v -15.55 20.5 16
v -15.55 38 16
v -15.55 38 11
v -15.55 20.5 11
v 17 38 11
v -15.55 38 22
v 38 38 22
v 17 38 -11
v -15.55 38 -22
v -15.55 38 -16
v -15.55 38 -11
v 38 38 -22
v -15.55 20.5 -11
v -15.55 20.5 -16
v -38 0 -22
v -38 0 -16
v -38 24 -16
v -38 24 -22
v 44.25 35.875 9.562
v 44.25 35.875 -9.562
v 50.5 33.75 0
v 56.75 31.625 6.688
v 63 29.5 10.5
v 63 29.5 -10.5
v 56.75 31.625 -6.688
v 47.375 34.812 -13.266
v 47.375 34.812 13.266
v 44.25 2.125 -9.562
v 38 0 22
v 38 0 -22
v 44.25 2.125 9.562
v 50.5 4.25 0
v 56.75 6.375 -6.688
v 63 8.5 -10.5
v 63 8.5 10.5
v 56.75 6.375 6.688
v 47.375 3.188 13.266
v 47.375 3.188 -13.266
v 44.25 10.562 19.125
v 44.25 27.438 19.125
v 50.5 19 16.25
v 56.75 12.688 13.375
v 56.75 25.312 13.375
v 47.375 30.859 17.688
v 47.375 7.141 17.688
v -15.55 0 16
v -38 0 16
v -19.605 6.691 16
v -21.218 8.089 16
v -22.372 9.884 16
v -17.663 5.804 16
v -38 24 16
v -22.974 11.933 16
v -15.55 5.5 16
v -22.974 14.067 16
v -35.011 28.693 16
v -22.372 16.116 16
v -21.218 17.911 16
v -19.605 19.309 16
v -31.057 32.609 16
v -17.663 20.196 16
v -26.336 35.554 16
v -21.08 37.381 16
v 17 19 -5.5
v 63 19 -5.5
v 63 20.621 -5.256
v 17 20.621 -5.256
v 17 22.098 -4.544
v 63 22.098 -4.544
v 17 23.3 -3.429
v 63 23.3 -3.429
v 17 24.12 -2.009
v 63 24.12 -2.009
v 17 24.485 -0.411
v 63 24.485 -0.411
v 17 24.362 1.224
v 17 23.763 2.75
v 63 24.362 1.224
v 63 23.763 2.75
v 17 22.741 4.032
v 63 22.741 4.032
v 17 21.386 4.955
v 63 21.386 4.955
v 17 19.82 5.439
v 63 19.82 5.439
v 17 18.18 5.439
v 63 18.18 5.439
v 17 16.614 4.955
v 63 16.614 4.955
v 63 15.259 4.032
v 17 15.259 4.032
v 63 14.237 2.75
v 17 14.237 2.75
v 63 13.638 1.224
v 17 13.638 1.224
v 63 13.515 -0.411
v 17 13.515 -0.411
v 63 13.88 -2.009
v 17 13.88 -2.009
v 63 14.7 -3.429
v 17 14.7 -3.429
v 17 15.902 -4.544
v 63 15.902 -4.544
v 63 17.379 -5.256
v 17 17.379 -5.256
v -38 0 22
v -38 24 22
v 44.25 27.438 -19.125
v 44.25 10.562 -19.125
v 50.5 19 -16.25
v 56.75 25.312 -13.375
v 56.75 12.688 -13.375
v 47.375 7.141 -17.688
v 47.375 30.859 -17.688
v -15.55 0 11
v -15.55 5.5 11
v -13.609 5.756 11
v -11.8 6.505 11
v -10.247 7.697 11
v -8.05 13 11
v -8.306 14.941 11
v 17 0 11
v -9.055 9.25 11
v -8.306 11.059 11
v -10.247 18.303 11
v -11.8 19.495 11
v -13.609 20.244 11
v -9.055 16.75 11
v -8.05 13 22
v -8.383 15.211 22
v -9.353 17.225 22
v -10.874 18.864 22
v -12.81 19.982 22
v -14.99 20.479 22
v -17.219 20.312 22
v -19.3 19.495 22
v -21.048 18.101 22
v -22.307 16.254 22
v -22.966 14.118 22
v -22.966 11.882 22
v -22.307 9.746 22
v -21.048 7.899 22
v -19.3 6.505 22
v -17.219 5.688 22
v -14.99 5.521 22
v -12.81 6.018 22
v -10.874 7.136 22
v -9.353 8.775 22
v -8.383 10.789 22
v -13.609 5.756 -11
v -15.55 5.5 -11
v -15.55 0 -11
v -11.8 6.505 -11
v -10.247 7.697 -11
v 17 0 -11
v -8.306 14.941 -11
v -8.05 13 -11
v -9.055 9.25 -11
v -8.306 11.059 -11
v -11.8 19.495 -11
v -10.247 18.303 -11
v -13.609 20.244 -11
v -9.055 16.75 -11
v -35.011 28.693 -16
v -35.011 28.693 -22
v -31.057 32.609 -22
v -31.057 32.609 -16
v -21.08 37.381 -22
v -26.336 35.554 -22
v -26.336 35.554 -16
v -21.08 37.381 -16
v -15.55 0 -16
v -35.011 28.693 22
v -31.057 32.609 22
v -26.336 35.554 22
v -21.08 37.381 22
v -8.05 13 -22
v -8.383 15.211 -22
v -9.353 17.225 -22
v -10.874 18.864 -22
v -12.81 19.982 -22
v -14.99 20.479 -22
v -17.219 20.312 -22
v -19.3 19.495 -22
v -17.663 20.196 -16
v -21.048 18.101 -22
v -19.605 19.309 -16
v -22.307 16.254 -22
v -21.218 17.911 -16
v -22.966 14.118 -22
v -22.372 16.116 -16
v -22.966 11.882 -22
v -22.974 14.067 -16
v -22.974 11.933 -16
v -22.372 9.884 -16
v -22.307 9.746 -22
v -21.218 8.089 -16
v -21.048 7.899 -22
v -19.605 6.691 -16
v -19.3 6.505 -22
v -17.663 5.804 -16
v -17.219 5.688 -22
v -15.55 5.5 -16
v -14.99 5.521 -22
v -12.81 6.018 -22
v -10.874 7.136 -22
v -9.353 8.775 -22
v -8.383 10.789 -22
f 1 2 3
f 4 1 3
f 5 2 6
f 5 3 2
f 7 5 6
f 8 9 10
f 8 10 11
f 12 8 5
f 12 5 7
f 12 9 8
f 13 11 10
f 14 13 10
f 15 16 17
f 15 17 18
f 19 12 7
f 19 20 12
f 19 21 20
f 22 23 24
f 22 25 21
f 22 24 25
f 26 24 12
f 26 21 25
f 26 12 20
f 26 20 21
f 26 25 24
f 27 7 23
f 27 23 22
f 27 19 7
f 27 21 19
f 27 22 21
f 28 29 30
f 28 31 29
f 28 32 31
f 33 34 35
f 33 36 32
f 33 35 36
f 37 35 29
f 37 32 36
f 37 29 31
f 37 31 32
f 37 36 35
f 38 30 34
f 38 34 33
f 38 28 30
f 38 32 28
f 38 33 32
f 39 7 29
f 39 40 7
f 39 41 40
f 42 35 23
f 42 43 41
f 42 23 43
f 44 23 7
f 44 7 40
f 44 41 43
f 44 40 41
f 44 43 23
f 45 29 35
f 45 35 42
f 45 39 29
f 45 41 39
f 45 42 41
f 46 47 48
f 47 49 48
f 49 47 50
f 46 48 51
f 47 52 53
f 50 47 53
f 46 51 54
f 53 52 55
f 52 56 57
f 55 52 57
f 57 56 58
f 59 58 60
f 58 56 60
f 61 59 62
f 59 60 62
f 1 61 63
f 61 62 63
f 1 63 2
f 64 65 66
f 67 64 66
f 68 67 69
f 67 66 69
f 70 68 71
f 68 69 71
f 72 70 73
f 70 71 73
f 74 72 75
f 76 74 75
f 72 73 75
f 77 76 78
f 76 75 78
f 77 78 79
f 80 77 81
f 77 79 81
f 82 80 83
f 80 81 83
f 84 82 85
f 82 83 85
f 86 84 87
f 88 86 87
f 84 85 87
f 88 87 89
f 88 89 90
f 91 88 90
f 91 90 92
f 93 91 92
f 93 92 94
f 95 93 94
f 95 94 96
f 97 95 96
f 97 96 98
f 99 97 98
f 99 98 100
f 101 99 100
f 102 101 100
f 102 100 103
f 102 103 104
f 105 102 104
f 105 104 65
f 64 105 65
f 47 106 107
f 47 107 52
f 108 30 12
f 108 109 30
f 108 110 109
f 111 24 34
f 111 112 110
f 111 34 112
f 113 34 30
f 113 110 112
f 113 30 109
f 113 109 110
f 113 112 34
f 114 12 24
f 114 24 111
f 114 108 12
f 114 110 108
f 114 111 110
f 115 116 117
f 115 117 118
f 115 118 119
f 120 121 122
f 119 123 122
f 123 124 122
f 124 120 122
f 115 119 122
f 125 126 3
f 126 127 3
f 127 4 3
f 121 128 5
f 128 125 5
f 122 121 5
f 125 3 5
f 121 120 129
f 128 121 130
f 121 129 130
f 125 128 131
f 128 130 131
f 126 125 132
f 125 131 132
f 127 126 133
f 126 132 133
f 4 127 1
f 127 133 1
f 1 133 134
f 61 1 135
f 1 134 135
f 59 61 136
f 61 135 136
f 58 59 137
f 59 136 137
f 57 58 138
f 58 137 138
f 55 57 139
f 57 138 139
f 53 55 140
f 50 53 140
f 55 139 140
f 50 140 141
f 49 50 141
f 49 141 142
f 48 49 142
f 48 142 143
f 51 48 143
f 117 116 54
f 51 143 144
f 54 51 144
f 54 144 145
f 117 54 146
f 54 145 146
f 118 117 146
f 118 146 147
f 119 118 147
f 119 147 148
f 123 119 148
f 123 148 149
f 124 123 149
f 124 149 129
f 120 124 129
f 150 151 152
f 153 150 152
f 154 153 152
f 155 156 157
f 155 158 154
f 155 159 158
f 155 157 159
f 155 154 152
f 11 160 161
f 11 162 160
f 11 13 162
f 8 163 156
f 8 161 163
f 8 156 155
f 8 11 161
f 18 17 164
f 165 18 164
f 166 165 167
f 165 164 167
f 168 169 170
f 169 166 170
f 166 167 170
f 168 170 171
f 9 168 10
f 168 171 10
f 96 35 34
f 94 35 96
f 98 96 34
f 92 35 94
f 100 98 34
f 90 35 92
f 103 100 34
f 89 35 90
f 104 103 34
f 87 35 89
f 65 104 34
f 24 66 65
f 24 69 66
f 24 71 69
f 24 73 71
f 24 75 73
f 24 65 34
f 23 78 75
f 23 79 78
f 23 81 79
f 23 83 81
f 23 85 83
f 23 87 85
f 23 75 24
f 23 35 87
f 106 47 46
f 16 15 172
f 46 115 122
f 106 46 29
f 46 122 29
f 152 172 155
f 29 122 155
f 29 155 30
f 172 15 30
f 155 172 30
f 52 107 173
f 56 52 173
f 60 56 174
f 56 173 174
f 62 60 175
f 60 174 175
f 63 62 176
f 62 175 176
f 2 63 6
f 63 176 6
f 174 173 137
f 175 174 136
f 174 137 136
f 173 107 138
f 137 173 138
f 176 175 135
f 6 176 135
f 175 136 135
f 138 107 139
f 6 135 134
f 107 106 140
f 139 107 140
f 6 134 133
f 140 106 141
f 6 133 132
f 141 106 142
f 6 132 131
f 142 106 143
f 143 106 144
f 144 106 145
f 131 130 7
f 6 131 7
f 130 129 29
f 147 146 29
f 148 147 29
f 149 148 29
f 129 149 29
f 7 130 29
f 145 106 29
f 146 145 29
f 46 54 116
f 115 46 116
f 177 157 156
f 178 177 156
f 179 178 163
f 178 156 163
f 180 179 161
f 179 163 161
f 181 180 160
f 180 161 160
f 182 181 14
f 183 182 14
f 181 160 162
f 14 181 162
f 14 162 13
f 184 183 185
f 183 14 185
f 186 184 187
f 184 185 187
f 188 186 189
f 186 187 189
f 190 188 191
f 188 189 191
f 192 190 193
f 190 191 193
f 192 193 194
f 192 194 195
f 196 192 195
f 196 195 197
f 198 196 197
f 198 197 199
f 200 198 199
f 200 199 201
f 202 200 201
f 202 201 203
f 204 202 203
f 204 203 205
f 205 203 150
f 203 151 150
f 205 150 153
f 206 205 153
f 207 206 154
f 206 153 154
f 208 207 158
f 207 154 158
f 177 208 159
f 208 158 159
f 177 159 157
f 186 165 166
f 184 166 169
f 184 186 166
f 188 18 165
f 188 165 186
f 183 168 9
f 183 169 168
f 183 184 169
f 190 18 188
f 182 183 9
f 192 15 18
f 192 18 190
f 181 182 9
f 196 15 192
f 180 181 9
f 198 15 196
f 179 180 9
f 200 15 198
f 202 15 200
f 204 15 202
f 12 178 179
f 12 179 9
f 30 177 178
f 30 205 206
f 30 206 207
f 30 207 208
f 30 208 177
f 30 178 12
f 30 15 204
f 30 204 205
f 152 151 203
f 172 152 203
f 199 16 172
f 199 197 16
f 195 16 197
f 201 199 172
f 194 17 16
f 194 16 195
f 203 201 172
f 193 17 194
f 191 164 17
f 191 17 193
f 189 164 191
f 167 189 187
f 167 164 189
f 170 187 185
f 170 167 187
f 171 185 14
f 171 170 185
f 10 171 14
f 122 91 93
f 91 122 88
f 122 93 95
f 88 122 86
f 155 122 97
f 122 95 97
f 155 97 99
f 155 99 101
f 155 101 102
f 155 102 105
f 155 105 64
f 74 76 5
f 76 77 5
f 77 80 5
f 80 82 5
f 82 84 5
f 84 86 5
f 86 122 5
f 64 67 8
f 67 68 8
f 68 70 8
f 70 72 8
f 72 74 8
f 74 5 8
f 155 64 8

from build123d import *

# Parameters (mm, degrees)
SKETCH1_W               = 76
SKETCH1_H               = 44
BOSS_EXTRUDE1_DEPTH     = 38
SKETCH2_R               = 7.5
CUT_EXTRUDE1_DEPTH      = 1
CUT_EXTRUDE1_DEPTH_BACK = 45
SKETCH3_W               = 22.449944321
SKETCH3_H               = 32
SKETCH3_W_2             = 32.550055679
SKETCH3_H_2             = 22
CUT_EXTRUDE2_DEPTH      = 1
CUT_EXTRUDE2_DEPTH_BACK = 39
SKETCH5_W               = 44
SKETCH5_H               = 38
SKETCH4_W               = 21
SKETCH4_H               = 21
SKETCH6_R               = 5.5
CUT_EXTRUDE3_DEPTH      = 1.0000001
CUT_EXTRUDE3_DEPTH_BACK = 102


with BuildPart() as part:
    # Sketch1 → Boss-Extrude1 (new body)
    with BuildSketch(Plane(origin=(0, 0, 0), x_dir=(1, 0, 0), z_dir=(0, 1, 0))):
        Rectangle(SKETCH1_W, SKETCH1_H)
    extrude(amount=BOSS_EXTRUDE1_DEPTH)

    # Sketch2 → Cut-Extrude1 (cut, two sides)
    with BuildSketch(Plane.XY.offset(22)) as cut_extrude1_sk:
        with Locations((-15.550055679, 13)):
            Circle(SKETCH2_R)
        with BuildLine():
            Line((-15.550055679, 38), (-38, 38))
            Line((-38, 38), (-38, 24))
            ThreePointArc((-38, 24), (-28.778812235, 34.213203436), (-15.550055679, 38))
        make_face()
    extrude(amount=CUT_EXTRUDE1_DEPTH, mode=Mode.SUBTRACT)
    extrude(cut_extrude1_sk.sketch, amount=-CUT_EXTRUDE1_DEPTH_BACK, mode=Mode.SUBTRACT)

    # Sketch3 → Cut-Extrude2 (cut, two sides)
    with BuildSketch(Plane(origin=(0, 38, 0), x_dir=(1, 0, 0), z_dir=(0, 1, 0))) as cut_extrude2_sk:
        with Locations((-26.77502784, 0)):
            Rectangle(SKETCH3_W, SKETCH3_H)
        with Locations((0.72497216, 0)):
            Rectangle(SKETCH3_W_2, SKETCH3_H_2)
    extrude(amount=CUT_EXTRUDE2_DEPTH, mode=Mode.SUBTRACT)
    extrude(cut_extrude2_sk.sketch, amount=-CUT_EXTRUDE2_DEPTH_BACK, mode=Mode.SUBTRACT)

    # Sketch5 → Loft1 section 0
    with BuildSketch(Plane(origin=(38, 0, 0), x_dir=(0, 0, -1), z_dir=(1, 0, 0))):
        with Locations((0, 19)):
            Rectangle(SKETCH5_W, SKETCH5_H)
    # Sketch4 → Loft1 section 1
    with BuildSketch(Plane(origin=(63, 0, 0), x_dir=(0, 0, -1), z_dir=(1, 0, 0))):
        with Locations((0, 19)):
            Rectangle(SKETCH4_W, SKETCH4_H)
    loft()

    # Sketch6 → Cut-Extrude3 (cut, two sides)
    with BuildSketch(Plane(origin=(63, 0, 0), x_dir=(0, 0, -1), z_dir=(1, 0, 0))) as cut_extrude3_sk:
        with Locations((0, 19)):
            Circle(SKETCH6_R)
    extrude(amount=CUT_EXTRUDE3_DEPTH, mode=Mode.SUBTRACT)
    extrude(cut_extrude3_sk.sketch, amount=-CUT_EXTRUDE3_DEPTH_BACK, mode=Mode.SUBTRACT)


solid = part.part
